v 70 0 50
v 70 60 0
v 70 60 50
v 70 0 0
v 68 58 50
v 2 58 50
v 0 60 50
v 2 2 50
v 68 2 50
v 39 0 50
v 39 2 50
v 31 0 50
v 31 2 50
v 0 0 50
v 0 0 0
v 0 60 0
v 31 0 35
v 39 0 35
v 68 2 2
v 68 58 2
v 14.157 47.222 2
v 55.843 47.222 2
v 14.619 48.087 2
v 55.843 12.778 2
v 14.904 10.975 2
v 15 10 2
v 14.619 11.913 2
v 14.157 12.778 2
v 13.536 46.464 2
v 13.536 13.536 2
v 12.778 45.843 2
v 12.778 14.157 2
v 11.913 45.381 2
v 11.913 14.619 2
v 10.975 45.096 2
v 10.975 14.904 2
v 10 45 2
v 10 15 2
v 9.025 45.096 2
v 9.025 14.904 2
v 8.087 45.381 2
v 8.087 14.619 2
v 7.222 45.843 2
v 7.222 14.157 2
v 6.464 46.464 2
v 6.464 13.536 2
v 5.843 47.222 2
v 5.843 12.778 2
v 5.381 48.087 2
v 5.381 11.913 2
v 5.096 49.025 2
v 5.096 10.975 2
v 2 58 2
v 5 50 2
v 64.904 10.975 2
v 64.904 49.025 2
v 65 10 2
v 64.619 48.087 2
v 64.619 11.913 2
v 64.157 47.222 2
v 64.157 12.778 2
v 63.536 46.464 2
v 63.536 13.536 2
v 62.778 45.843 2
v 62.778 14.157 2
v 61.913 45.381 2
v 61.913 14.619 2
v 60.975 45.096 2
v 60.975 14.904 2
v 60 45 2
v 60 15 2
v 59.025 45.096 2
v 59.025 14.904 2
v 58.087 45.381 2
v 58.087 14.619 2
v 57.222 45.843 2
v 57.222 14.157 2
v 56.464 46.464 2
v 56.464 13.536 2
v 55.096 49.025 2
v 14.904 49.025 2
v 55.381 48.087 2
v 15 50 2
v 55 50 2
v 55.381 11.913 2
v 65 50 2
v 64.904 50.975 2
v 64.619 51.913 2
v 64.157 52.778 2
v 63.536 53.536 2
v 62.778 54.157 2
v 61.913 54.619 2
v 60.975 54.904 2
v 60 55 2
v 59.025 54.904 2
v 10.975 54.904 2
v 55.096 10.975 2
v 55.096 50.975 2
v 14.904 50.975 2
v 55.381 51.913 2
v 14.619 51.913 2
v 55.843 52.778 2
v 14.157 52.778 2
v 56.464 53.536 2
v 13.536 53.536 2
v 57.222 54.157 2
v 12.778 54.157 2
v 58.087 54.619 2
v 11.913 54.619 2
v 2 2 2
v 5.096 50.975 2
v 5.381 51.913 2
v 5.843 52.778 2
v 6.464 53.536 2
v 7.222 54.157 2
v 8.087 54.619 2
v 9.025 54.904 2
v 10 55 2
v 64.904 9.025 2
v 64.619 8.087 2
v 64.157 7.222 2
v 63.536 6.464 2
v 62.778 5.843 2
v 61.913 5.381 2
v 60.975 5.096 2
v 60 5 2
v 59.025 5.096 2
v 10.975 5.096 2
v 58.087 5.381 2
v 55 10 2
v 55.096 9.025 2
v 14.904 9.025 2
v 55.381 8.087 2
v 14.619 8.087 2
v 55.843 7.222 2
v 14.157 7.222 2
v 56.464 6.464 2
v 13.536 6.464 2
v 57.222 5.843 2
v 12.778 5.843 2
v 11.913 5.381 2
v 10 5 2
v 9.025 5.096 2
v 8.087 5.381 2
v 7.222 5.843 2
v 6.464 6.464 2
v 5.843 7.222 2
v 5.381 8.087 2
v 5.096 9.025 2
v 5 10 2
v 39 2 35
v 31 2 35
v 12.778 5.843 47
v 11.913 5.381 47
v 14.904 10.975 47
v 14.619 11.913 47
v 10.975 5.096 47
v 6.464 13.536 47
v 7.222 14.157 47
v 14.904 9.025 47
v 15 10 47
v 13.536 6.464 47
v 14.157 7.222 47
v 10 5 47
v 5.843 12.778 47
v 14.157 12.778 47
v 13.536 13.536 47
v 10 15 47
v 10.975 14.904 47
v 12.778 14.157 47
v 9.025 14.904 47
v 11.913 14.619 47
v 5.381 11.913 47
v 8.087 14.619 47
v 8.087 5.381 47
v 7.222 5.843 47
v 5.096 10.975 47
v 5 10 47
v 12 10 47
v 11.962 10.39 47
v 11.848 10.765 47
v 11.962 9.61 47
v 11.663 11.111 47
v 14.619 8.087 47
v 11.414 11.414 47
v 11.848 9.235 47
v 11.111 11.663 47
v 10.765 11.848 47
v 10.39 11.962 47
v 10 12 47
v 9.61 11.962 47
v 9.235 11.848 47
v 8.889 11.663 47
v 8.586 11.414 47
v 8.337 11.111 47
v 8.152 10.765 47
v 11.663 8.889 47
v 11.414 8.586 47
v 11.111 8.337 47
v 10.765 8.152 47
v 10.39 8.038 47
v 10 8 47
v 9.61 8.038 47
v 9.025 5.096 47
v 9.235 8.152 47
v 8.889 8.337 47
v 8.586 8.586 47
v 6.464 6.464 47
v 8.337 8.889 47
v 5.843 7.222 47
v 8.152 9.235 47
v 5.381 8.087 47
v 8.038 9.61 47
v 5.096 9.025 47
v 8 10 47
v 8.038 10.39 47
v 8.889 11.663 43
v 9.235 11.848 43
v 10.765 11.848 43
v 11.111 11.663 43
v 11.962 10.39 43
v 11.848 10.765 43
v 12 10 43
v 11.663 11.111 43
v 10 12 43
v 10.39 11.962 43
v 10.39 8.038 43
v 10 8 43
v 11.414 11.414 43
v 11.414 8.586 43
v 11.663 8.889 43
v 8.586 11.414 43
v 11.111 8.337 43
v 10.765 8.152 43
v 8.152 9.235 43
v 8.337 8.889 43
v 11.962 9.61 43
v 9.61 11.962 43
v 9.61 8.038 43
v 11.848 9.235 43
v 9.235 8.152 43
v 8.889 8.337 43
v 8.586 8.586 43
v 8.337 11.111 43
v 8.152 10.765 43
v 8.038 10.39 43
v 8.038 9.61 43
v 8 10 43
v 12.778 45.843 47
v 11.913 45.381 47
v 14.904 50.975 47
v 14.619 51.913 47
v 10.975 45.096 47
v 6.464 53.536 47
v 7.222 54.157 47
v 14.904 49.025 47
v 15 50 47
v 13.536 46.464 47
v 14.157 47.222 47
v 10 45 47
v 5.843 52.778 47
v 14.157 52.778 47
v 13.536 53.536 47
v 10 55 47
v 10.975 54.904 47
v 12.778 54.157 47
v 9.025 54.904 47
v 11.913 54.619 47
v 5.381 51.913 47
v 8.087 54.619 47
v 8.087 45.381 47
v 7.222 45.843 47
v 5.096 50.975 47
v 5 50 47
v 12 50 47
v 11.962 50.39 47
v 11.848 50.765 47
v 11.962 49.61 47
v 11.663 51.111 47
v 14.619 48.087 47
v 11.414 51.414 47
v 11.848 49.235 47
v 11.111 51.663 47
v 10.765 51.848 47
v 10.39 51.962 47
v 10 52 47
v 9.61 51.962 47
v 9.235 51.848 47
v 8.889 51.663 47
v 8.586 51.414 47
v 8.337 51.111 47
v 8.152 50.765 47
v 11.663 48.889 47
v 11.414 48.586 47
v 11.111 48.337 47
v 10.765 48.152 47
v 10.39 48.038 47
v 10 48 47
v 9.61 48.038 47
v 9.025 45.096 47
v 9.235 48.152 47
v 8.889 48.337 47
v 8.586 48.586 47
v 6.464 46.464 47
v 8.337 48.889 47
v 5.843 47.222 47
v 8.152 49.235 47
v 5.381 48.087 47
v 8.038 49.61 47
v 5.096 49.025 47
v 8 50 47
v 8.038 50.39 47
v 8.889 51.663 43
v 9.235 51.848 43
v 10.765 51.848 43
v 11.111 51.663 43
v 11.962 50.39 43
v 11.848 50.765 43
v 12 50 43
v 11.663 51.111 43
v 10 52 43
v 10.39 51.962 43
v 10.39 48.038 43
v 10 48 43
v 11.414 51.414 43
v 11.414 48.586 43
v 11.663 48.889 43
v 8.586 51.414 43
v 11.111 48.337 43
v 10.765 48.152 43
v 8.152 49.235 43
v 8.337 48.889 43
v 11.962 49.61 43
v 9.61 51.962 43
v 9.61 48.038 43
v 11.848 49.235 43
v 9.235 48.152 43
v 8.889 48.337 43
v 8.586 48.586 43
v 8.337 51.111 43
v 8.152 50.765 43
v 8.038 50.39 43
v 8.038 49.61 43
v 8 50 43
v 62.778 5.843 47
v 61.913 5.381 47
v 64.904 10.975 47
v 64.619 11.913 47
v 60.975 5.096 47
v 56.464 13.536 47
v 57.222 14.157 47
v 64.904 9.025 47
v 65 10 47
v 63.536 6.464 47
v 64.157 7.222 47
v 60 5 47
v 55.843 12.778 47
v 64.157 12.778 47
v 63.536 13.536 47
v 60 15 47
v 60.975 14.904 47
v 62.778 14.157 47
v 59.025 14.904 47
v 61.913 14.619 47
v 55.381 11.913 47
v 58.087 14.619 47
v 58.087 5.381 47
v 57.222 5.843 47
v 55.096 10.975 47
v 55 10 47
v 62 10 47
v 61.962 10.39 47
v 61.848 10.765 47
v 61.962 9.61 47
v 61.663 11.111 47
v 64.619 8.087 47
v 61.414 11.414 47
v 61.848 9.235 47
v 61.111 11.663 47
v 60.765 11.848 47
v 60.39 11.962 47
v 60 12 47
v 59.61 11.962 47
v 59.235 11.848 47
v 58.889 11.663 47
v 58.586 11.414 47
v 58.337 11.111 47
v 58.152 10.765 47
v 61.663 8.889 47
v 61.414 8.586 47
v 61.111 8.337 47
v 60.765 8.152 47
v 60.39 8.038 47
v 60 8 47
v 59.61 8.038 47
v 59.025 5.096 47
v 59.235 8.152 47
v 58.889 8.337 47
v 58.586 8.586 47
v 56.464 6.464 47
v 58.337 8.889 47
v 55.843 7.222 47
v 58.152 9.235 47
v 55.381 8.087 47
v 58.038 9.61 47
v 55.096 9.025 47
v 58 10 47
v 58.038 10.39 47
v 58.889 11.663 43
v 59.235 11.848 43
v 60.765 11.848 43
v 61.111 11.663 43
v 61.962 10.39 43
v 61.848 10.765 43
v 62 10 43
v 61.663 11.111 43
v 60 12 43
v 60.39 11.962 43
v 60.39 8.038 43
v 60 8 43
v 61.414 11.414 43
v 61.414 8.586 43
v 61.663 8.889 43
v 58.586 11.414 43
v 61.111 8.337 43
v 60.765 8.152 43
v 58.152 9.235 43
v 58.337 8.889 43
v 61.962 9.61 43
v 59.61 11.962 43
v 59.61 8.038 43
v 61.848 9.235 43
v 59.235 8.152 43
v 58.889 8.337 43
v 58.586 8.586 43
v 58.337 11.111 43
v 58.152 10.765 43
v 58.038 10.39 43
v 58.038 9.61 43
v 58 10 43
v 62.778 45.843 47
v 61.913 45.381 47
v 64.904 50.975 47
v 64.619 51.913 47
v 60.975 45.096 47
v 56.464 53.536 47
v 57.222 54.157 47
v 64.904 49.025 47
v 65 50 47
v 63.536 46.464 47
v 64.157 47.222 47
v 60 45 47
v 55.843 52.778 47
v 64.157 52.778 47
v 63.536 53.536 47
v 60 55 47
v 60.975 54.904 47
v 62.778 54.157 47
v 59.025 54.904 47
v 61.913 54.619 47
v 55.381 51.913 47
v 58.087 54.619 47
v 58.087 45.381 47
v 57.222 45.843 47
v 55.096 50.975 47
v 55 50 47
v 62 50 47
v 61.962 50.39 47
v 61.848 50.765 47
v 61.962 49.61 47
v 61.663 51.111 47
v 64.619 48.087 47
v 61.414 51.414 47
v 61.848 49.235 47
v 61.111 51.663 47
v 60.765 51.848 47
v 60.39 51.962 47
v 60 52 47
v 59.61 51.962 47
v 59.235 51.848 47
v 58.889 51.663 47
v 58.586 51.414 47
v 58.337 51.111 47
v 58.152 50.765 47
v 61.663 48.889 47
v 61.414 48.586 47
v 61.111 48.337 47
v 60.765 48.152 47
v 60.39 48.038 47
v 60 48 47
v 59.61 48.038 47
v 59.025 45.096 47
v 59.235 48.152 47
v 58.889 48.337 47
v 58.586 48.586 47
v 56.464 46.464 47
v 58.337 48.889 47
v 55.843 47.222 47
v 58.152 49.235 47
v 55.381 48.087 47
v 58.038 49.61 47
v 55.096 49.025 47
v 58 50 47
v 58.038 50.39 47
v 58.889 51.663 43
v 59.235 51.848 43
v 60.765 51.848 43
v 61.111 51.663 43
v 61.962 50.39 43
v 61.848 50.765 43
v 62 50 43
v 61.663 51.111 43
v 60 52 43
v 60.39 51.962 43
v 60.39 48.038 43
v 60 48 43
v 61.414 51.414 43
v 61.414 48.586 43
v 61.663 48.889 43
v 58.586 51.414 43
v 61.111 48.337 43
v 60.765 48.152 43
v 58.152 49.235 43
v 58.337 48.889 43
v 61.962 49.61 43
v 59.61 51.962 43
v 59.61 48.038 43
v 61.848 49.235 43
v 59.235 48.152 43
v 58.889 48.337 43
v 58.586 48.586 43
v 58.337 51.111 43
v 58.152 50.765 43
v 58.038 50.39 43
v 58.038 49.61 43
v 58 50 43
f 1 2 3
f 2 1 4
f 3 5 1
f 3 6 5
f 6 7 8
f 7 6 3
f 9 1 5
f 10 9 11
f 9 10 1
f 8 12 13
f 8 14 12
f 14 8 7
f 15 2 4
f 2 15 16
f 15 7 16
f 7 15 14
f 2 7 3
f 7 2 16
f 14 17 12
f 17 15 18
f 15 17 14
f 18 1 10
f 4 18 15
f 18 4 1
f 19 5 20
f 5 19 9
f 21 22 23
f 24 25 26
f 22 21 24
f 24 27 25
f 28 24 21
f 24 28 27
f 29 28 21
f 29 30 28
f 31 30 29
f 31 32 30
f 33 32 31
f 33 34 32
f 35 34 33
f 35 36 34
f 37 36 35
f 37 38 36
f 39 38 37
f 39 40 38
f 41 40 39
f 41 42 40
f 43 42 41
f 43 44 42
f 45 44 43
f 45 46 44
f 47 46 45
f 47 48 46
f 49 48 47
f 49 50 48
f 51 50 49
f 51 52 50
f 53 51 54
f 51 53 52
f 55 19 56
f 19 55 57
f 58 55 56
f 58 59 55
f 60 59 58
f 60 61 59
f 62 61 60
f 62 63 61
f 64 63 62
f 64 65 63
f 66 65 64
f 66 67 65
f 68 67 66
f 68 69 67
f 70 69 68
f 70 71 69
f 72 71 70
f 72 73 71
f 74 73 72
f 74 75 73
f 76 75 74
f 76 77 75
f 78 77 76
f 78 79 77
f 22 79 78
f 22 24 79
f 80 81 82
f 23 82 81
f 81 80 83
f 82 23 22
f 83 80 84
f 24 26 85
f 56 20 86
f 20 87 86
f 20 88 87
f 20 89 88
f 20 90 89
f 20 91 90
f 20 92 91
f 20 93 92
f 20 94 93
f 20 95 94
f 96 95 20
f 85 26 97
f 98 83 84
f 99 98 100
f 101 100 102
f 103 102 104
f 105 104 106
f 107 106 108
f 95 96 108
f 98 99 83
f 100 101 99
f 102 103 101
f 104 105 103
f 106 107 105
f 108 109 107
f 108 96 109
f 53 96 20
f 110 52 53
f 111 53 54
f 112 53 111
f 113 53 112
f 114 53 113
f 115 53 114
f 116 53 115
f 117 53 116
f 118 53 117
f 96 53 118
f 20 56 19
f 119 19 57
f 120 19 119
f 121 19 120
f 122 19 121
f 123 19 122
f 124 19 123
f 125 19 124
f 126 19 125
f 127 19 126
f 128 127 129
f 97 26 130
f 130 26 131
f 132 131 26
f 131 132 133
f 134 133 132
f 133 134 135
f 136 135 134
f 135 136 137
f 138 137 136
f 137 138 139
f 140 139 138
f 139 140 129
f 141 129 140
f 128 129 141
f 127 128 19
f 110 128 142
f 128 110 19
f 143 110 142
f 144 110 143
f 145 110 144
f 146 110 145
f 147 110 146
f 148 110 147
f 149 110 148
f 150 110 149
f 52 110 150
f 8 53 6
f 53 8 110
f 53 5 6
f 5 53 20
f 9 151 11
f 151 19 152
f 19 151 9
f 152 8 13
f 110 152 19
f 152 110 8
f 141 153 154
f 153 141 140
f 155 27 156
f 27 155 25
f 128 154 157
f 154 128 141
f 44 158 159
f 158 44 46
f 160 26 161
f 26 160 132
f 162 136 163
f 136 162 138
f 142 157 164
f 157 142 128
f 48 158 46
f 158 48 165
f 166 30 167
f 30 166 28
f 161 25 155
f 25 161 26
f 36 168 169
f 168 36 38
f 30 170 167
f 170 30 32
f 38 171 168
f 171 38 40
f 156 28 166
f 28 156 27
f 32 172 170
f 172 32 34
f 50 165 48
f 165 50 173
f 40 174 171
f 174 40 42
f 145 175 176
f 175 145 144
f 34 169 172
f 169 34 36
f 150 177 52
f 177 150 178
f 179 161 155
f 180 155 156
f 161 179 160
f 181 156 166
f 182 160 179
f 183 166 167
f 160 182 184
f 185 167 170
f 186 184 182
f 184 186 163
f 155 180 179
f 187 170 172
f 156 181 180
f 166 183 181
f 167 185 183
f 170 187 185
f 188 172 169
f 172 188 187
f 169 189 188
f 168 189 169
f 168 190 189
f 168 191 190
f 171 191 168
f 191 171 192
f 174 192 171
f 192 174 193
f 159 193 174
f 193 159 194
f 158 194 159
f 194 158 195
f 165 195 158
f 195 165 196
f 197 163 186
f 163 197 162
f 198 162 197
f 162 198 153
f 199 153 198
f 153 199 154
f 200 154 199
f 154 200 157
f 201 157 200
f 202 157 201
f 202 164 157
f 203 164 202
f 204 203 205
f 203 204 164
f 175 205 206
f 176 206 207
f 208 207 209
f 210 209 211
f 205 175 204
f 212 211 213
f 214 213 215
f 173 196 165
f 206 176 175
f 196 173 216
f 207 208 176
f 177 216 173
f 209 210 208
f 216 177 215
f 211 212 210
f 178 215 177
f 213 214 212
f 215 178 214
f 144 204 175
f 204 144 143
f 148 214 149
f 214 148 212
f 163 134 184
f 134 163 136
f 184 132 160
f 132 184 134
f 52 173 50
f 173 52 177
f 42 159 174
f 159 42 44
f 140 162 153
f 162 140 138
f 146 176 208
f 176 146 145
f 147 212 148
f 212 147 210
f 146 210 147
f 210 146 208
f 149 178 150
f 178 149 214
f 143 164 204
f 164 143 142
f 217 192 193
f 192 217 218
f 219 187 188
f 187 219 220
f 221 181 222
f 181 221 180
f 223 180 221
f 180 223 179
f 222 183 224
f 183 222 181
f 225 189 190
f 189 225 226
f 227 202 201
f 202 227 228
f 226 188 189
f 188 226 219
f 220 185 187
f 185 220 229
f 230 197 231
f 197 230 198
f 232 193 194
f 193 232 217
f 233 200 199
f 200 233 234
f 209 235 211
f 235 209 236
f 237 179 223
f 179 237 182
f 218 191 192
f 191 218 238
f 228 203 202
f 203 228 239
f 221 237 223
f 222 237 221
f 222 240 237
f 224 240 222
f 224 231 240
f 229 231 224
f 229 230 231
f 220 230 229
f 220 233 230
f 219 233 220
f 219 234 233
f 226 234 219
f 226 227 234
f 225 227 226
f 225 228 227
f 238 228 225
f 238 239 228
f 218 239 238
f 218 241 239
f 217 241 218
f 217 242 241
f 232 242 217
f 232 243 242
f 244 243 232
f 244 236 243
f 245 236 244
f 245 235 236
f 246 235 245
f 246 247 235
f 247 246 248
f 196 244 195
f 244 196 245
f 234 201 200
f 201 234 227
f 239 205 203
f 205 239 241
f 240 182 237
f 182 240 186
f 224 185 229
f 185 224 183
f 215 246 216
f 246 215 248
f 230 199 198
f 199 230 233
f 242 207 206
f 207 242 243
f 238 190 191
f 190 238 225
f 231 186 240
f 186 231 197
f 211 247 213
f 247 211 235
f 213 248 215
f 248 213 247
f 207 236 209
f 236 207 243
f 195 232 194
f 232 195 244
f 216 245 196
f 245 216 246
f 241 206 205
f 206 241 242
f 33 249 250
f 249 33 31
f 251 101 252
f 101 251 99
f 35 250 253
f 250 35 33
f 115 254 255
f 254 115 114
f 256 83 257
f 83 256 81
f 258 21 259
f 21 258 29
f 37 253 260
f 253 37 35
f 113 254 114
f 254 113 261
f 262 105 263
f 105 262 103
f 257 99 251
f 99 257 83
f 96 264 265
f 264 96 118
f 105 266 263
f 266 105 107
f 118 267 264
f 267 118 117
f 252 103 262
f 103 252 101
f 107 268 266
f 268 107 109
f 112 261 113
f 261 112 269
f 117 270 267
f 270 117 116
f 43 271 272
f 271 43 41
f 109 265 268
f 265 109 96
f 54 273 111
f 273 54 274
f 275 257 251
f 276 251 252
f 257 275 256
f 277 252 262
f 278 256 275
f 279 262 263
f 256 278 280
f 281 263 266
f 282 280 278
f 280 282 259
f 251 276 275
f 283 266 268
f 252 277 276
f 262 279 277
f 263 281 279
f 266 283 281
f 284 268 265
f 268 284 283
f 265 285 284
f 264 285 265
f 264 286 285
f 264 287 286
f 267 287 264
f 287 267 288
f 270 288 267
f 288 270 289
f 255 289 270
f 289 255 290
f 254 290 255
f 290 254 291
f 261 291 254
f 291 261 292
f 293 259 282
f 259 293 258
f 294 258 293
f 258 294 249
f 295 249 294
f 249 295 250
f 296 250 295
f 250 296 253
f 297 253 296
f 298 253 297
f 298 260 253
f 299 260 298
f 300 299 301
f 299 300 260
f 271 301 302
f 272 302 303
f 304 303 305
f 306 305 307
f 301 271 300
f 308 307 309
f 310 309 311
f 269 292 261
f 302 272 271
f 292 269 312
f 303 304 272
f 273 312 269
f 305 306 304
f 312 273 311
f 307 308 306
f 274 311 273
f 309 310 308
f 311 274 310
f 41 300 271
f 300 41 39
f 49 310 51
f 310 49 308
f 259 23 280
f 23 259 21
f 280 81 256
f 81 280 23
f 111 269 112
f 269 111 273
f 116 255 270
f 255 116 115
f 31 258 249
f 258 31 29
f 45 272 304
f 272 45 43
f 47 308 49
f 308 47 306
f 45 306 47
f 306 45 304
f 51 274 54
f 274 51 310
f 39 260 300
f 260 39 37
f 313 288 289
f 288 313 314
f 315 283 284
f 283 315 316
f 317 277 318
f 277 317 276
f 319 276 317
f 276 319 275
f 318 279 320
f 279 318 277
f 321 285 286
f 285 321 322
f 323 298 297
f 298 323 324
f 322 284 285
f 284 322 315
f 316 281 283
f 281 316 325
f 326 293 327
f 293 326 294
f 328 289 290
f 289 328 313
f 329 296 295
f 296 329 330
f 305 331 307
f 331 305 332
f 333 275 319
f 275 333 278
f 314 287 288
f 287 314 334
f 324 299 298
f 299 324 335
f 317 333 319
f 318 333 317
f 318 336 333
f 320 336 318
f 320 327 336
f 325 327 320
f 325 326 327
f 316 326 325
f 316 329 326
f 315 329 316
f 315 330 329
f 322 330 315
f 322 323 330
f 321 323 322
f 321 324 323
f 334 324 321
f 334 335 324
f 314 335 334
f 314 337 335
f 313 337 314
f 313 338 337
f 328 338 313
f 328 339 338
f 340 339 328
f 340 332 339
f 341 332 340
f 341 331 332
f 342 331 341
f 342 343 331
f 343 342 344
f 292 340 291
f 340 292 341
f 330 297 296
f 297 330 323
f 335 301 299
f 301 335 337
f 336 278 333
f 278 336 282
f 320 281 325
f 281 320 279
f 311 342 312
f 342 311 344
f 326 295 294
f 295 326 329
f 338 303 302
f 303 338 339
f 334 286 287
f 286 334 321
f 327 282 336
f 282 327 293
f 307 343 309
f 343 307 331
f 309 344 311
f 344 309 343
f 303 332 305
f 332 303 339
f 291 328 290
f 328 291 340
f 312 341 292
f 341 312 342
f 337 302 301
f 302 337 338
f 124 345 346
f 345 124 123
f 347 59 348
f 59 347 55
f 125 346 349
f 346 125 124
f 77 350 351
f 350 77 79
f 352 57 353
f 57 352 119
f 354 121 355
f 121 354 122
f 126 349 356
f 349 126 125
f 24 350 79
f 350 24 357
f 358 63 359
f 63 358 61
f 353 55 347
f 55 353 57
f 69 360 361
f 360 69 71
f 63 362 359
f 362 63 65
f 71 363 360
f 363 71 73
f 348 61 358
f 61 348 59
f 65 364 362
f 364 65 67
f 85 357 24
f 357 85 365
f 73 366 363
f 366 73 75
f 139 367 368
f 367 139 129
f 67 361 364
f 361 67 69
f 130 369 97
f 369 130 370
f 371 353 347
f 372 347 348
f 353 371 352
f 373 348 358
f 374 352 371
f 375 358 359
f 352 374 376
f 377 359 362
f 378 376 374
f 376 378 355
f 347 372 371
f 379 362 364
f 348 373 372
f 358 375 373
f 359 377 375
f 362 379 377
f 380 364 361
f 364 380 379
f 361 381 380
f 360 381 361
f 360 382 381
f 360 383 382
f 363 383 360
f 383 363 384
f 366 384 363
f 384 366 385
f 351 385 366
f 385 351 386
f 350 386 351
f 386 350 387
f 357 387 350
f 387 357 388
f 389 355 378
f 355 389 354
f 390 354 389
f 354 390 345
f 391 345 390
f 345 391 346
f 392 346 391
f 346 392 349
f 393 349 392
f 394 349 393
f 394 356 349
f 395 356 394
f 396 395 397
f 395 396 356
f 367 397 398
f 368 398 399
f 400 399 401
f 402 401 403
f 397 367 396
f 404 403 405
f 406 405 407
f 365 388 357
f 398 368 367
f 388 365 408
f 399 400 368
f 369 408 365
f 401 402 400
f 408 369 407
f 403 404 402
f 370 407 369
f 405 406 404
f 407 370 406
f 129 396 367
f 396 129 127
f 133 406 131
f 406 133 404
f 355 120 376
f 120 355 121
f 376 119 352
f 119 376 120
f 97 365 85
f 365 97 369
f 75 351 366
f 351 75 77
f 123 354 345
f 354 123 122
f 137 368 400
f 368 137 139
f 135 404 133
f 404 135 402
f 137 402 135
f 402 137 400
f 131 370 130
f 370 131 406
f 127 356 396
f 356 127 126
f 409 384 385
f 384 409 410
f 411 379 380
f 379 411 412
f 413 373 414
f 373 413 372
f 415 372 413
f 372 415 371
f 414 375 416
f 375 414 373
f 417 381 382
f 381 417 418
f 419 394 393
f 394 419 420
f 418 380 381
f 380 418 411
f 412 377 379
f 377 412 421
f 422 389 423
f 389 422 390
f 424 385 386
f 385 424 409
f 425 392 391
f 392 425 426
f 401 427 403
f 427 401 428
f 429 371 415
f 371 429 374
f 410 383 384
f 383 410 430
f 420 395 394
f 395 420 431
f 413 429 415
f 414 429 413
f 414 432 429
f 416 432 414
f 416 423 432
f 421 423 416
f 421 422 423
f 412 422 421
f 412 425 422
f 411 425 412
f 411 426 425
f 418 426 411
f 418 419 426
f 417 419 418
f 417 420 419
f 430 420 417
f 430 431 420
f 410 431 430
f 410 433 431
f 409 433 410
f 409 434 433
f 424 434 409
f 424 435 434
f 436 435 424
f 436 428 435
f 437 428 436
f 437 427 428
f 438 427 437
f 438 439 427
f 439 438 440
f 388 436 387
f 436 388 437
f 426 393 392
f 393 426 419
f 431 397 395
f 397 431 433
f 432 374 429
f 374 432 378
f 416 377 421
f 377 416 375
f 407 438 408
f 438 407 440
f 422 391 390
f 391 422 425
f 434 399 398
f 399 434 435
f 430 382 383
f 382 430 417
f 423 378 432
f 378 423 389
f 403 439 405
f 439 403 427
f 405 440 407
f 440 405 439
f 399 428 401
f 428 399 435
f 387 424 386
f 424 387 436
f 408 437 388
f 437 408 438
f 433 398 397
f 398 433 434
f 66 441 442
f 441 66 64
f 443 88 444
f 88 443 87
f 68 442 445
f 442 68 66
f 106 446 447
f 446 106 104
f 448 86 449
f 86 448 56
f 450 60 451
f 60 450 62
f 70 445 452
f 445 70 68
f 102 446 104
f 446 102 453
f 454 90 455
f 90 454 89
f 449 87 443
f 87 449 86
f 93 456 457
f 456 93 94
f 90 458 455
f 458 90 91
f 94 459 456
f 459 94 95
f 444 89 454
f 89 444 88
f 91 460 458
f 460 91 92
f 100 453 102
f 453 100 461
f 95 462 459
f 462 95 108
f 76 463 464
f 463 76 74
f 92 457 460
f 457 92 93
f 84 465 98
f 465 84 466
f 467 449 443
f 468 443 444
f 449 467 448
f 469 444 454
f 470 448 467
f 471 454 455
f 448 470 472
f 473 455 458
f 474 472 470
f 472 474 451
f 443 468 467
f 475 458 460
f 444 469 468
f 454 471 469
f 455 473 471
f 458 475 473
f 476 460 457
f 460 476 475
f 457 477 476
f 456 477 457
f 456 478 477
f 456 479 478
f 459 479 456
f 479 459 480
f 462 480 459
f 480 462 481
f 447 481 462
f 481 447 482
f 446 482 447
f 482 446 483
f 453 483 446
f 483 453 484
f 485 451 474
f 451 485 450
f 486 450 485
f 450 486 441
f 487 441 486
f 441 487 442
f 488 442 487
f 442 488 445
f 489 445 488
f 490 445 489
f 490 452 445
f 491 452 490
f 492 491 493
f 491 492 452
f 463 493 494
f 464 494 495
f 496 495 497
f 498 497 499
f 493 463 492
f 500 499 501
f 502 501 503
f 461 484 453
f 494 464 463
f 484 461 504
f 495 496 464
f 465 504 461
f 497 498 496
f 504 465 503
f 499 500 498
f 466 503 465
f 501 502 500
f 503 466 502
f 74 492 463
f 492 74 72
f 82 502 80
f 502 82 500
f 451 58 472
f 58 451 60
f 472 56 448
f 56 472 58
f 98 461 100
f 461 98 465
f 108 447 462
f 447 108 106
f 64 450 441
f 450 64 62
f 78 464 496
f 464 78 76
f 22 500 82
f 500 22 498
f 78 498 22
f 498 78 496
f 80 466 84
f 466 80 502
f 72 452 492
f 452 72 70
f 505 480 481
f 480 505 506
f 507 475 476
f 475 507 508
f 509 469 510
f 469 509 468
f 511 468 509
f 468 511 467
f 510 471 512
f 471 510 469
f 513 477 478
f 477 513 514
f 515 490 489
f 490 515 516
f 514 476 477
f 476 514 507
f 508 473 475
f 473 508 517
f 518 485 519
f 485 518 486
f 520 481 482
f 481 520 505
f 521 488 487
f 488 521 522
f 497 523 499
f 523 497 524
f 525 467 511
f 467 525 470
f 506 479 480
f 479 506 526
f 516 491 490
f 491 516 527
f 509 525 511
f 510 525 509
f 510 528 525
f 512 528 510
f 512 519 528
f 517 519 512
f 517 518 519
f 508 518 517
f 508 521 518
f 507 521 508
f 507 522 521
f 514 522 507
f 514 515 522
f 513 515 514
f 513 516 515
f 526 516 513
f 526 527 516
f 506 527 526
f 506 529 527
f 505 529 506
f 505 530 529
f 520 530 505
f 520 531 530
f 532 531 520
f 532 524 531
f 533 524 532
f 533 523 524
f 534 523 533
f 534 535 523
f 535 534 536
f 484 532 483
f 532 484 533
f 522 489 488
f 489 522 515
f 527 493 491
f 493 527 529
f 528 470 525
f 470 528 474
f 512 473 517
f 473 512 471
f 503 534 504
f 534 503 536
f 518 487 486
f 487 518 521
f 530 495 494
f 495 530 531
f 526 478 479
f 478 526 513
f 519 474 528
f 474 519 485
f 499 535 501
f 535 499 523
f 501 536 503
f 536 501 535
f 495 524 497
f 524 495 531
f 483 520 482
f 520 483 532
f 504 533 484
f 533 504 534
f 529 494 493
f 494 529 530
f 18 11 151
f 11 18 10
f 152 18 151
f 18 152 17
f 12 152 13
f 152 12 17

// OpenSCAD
$fn = 32;

// ----------------------------------------------------------------------
// Enclosure box: both enclosure
// ----------------------------------------------------------------------

// --- parameters (mm) ---
box_l = 70;               // outer length, X
box_w = 60;               // outer width, Y
box_h = 50;               // outer height
wall_t = 2;               // wall thickness
boss_r = 5;               // corner boss radius
hole_r = 2;               // boss screw hole radius
boss_in = 10;             // boss inset from the corners
notch_w = 8;              // cable notch width
notch_h = 15;             // cable notch height
fit_tol = 0.02;           // tolerance for press fits, mm
free_tol = 0.2;           // tolerance for clearance fits, mm

inner_h = box_h - wall_t;  // cavity depth
boss_h = inner_h - 2;  // corner boss height

difference() {
  union() {
    difference() {
      cube([box_l, box_w, box_h]);
      translate([wall_t, wall_t, wall_t])
        cube([box_l - 2 * wall_t, box_w - 2 * wall_t, box_h]);
    }
    for (sx = [0, 1], sy = [0, 1])
      translate([sx ? box_l - boss_in : boss_in,
                 sy ? box_w - boss_in : boss_in, wall_t - 1])
        difference() {
          cylinder(r = boss_r, h = boss_h);
          translate([0, 0, boss_h - 4])
            cylinder(r = hole_r, h = 5);
        }
  }
  translate([box_l / 2 - notch_w / 2, -1, box_h - notch_h])
    cube([notch_w, wall_t + 2, notch_h + 1]);
}
